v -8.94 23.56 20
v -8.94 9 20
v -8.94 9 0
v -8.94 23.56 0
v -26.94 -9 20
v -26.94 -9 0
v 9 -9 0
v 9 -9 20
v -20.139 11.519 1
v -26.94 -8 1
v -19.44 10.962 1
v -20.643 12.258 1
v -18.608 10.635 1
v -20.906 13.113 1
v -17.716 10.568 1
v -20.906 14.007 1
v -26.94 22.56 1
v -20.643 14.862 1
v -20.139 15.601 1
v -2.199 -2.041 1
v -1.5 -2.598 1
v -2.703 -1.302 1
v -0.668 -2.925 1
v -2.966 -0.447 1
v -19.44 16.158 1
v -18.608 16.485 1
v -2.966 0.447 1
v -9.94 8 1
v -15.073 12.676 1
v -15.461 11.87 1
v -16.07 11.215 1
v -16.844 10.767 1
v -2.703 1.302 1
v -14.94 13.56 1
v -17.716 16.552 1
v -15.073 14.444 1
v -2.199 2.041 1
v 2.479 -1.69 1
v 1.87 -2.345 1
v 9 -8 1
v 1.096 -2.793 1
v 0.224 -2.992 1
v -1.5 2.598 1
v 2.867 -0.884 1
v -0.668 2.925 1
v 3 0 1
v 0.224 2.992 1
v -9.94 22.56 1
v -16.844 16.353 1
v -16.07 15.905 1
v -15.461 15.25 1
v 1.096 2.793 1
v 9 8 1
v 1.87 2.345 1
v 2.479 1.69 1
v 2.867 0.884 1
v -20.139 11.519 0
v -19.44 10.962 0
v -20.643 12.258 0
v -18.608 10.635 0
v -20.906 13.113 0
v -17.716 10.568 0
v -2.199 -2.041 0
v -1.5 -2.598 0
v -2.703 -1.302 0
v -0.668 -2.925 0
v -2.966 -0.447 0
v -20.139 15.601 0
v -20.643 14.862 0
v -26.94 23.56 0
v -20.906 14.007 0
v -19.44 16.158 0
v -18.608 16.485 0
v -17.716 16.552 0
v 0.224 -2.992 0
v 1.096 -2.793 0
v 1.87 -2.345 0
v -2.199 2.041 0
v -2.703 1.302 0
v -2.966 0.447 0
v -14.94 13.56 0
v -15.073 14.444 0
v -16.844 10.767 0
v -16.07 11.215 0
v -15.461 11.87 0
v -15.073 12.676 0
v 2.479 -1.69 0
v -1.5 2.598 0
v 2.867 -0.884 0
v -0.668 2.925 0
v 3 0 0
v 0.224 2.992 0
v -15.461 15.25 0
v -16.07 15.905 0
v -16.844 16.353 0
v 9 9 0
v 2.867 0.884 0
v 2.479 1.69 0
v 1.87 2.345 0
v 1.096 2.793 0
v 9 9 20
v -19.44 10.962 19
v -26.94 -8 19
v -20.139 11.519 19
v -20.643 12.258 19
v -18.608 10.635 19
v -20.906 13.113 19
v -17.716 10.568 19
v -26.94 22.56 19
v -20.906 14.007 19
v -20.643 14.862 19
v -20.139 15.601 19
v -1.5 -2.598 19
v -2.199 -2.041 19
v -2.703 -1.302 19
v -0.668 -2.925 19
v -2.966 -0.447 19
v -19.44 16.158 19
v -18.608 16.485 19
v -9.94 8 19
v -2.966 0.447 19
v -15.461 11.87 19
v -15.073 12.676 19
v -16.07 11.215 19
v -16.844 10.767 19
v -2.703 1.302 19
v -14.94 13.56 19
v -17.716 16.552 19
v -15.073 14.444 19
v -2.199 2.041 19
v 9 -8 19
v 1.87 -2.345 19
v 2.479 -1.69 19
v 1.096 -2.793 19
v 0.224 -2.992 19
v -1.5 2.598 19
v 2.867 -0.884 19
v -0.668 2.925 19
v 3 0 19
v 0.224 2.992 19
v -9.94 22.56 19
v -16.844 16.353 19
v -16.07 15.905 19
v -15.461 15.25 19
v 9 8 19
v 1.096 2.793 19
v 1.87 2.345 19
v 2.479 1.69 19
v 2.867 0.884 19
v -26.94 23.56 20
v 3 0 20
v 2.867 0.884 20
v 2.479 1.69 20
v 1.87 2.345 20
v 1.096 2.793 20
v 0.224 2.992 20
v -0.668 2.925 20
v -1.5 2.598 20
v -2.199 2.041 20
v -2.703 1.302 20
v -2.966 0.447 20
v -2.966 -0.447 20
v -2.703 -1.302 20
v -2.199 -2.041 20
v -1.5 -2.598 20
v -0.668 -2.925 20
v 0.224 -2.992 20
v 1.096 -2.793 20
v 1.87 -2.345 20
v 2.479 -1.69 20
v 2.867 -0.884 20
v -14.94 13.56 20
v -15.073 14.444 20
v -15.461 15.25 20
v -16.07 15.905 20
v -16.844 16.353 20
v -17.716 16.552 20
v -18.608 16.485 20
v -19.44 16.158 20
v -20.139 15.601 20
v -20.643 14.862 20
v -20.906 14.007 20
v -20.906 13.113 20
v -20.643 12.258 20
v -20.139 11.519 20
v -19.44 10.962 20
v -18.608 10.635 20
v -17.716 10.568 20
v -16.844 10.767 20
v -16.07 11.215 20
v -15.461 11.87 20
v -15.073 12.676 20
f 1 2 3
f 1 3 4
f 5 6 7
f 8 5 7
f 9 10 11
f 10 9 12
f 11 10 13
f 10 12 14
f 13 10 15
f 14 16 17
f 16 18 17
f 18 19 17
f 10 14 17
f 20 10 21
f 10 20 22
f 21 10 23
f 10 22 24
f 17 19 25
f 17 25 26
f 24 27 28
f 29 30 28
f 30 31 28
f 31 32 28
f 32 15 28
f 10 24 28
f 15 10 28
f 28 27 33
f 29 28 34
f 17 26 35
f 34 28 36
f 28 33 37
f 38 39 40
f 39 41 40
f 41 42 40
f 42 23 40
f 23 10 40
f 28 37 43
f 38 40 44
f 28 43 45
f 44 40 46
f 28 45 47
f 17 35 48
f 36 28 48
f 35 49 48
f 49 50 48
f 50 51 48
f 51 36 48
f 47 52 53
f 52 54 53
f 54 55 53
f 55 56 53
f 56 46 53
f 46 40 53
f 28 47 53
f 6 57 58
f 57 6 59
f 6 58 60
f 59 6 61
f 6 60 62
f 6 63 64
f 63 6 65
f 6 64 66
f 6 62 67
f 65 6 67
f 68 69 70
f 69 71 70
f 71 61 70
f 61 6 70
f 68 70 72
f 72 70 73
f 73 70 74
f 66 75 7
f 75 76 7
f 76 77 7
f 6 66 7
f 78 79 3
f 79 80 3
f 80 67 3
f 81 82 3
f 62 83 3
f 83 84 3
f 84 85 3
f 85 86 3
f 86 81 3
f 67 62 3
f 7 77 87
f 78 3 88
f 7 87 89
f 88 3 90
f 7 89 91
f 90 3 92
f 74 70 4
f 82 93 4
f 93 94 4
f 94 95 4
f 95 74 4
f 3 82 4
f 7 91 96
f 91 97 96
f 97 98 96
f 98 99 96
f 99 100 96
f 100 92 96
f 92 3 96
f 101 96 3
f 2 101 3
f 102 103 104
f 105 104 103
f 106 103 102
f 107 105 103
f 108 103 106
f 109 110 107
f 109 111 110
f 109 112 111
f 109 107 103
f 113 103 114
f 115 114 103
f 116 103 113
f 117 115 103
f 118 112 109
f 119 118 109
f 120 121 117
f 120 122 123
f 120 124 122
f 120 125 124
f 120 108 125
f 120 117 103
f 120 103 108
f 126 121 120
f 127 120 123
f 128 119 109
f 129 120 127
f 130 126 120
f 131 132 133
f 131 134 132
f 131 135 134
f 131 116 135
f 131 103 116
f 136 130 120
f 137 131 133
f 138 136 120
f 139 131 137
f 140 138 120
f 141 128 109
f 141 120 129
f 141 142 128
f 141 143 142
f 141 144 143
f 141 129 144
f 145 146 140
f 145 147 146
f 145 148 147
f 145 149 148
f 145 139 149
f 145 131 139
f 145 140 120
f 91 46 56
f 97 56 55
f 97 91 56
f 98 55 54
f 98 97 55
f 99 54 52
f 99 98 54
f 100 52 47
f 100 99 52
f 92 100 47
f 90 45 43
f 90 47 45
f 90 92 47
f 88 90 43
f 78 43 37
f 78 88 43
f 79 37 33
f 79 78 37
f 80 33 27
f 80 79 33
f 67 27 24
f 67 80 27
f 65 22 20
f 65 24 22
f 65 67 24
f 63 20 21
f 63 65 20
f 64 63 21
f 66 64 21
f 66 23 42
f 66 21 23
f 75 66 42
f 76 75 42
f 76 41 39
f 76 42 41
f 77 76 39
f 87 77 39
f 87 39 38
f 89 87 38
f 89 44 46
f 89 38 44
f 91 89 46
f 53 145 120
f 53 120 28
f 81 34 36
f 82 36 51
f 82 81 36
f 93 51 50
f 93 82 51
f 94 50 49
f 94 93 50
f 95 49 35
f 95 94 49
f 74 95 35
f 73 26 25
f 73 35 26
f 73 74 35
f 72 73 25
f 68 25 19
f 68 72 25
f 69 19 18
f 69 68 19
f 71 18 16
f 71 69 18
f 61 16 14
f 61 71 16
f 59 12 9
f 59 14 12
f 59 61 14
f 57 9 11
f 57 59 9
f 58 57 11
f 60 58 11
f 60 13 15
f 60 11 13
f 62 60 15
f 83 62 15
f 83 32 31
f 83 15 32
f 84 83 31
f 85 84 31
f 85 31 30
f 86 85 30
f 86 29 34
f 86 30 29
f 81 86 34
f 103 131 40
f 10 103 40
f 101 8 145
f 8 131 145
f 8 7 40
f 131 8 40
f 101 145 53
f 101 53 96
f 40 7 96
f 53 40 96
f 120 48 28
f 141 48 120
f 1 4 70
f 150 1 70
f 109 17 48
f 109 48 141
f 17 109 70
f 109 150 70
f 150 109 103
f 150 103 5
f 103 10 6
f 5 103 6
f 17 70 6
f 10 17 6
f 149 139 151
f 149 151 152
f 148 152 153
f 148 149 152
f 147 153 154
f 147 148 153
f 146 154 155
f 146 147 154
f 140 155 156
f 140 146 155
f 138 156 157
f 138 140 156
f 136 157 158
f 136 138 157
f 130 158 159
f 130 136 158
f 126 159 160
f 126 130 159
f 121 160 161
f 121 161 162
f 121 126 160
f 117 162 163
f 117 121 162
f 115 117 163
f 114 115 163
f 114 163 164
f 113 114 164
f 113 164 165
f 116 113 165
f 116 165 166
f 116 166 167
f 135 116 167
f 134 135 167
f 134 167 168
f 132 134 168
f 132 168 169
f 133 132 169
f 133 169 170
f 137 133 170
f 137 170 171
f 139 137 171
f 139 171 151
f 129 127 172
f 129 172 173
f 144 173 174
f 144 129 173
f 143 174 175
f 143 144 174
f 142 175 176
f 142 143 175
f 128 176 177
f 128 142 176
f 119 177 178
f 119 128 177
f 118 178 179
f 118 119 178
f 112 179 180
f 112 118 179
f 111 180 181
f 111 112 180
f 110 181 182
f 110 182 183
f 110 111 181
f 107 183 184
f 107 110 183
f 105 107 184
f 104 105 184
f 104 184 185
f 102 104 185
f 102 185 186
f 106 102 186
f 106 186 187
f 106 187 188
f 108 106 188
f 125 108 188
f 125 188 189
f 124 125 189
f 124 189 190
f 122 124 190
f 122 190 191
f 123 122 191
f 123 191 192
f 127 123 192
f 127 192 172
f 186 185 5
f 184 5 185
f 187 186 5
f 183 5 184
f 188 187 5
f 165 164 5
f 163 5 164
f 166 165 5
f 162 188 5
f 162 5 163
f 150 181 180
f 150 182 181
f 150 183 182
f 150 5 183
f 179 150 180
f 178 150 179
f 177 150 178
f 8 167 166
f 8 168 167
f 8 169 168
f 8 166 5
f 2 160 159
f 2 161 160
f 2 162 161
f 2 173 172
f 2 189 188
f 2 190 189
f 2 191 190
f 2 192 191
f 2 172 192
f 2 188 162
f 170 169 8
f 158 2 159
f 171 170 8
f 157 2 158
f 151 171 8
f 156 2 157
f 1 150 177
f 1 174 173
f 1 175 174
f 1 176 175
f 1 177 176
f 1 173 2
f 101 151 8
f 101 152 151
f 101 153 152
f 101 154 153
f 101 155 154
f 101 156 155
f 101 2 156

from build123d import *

# Parameters (mm, degrees)
SKETCH4_R           = 3
BOSS_EXTRUDE1_DEPTH = 20
SKETCH5_W           = 18
SKETCH5_H           = 16
CUT_EXTRUDE3_DEPTH  = 36.94
SKETCH6_W           = 18
SKETCH6_H           = 14.56
CUT_EXTRUDE4_DEPTH  = 17


with BuildPart() as part:
    # Sketch4 → Boss-Extrude1 (new body)
    with BuildSketch(Plane.XY):
        Polygon((-8.94, 9), (-8.94, 23.56), (-26.94, 23.56), (-26.94, -9), (9, -9), (9, 9), align=None)
        Circle(SKETCH4_R, mode=Mode.SUBTRACT)
        with Locations((-17.94, 13.56)):
            Circle(SKETCH4_R, mode=Mode.SUBTRACT)
    extrude(amount=BOSS_EXTRUDE1_DEPTH)

    # Sketch5 → Cut-Extrude3 (cut, through all)
    with BuildSketch(Plane(origin=(9, 0, 0), x_dir=(0, 0, -1), z_dir=(1, 0, 0))):
        with Locations((-10, 0)):
            Rectangle(SKETCH5_W, SKETCH5_H)
    extrude(amount=-CUT_EXTRUDE3_DEPTH, mode=Mode.SUBTRACT)

    # Sketch6 → Cut-Extrude4 (cut)
    with BuildSketch(Plane.ZY.offset(26.94)):
        with Locations((10, 15.28)):
            Rectangle(SKETCH6_W, SKETCH6_H)
    extrude(amount=-CUT_EXTRUDE4_DEPTH, mode=Mode.SUBTRACT)


solid = part.part
